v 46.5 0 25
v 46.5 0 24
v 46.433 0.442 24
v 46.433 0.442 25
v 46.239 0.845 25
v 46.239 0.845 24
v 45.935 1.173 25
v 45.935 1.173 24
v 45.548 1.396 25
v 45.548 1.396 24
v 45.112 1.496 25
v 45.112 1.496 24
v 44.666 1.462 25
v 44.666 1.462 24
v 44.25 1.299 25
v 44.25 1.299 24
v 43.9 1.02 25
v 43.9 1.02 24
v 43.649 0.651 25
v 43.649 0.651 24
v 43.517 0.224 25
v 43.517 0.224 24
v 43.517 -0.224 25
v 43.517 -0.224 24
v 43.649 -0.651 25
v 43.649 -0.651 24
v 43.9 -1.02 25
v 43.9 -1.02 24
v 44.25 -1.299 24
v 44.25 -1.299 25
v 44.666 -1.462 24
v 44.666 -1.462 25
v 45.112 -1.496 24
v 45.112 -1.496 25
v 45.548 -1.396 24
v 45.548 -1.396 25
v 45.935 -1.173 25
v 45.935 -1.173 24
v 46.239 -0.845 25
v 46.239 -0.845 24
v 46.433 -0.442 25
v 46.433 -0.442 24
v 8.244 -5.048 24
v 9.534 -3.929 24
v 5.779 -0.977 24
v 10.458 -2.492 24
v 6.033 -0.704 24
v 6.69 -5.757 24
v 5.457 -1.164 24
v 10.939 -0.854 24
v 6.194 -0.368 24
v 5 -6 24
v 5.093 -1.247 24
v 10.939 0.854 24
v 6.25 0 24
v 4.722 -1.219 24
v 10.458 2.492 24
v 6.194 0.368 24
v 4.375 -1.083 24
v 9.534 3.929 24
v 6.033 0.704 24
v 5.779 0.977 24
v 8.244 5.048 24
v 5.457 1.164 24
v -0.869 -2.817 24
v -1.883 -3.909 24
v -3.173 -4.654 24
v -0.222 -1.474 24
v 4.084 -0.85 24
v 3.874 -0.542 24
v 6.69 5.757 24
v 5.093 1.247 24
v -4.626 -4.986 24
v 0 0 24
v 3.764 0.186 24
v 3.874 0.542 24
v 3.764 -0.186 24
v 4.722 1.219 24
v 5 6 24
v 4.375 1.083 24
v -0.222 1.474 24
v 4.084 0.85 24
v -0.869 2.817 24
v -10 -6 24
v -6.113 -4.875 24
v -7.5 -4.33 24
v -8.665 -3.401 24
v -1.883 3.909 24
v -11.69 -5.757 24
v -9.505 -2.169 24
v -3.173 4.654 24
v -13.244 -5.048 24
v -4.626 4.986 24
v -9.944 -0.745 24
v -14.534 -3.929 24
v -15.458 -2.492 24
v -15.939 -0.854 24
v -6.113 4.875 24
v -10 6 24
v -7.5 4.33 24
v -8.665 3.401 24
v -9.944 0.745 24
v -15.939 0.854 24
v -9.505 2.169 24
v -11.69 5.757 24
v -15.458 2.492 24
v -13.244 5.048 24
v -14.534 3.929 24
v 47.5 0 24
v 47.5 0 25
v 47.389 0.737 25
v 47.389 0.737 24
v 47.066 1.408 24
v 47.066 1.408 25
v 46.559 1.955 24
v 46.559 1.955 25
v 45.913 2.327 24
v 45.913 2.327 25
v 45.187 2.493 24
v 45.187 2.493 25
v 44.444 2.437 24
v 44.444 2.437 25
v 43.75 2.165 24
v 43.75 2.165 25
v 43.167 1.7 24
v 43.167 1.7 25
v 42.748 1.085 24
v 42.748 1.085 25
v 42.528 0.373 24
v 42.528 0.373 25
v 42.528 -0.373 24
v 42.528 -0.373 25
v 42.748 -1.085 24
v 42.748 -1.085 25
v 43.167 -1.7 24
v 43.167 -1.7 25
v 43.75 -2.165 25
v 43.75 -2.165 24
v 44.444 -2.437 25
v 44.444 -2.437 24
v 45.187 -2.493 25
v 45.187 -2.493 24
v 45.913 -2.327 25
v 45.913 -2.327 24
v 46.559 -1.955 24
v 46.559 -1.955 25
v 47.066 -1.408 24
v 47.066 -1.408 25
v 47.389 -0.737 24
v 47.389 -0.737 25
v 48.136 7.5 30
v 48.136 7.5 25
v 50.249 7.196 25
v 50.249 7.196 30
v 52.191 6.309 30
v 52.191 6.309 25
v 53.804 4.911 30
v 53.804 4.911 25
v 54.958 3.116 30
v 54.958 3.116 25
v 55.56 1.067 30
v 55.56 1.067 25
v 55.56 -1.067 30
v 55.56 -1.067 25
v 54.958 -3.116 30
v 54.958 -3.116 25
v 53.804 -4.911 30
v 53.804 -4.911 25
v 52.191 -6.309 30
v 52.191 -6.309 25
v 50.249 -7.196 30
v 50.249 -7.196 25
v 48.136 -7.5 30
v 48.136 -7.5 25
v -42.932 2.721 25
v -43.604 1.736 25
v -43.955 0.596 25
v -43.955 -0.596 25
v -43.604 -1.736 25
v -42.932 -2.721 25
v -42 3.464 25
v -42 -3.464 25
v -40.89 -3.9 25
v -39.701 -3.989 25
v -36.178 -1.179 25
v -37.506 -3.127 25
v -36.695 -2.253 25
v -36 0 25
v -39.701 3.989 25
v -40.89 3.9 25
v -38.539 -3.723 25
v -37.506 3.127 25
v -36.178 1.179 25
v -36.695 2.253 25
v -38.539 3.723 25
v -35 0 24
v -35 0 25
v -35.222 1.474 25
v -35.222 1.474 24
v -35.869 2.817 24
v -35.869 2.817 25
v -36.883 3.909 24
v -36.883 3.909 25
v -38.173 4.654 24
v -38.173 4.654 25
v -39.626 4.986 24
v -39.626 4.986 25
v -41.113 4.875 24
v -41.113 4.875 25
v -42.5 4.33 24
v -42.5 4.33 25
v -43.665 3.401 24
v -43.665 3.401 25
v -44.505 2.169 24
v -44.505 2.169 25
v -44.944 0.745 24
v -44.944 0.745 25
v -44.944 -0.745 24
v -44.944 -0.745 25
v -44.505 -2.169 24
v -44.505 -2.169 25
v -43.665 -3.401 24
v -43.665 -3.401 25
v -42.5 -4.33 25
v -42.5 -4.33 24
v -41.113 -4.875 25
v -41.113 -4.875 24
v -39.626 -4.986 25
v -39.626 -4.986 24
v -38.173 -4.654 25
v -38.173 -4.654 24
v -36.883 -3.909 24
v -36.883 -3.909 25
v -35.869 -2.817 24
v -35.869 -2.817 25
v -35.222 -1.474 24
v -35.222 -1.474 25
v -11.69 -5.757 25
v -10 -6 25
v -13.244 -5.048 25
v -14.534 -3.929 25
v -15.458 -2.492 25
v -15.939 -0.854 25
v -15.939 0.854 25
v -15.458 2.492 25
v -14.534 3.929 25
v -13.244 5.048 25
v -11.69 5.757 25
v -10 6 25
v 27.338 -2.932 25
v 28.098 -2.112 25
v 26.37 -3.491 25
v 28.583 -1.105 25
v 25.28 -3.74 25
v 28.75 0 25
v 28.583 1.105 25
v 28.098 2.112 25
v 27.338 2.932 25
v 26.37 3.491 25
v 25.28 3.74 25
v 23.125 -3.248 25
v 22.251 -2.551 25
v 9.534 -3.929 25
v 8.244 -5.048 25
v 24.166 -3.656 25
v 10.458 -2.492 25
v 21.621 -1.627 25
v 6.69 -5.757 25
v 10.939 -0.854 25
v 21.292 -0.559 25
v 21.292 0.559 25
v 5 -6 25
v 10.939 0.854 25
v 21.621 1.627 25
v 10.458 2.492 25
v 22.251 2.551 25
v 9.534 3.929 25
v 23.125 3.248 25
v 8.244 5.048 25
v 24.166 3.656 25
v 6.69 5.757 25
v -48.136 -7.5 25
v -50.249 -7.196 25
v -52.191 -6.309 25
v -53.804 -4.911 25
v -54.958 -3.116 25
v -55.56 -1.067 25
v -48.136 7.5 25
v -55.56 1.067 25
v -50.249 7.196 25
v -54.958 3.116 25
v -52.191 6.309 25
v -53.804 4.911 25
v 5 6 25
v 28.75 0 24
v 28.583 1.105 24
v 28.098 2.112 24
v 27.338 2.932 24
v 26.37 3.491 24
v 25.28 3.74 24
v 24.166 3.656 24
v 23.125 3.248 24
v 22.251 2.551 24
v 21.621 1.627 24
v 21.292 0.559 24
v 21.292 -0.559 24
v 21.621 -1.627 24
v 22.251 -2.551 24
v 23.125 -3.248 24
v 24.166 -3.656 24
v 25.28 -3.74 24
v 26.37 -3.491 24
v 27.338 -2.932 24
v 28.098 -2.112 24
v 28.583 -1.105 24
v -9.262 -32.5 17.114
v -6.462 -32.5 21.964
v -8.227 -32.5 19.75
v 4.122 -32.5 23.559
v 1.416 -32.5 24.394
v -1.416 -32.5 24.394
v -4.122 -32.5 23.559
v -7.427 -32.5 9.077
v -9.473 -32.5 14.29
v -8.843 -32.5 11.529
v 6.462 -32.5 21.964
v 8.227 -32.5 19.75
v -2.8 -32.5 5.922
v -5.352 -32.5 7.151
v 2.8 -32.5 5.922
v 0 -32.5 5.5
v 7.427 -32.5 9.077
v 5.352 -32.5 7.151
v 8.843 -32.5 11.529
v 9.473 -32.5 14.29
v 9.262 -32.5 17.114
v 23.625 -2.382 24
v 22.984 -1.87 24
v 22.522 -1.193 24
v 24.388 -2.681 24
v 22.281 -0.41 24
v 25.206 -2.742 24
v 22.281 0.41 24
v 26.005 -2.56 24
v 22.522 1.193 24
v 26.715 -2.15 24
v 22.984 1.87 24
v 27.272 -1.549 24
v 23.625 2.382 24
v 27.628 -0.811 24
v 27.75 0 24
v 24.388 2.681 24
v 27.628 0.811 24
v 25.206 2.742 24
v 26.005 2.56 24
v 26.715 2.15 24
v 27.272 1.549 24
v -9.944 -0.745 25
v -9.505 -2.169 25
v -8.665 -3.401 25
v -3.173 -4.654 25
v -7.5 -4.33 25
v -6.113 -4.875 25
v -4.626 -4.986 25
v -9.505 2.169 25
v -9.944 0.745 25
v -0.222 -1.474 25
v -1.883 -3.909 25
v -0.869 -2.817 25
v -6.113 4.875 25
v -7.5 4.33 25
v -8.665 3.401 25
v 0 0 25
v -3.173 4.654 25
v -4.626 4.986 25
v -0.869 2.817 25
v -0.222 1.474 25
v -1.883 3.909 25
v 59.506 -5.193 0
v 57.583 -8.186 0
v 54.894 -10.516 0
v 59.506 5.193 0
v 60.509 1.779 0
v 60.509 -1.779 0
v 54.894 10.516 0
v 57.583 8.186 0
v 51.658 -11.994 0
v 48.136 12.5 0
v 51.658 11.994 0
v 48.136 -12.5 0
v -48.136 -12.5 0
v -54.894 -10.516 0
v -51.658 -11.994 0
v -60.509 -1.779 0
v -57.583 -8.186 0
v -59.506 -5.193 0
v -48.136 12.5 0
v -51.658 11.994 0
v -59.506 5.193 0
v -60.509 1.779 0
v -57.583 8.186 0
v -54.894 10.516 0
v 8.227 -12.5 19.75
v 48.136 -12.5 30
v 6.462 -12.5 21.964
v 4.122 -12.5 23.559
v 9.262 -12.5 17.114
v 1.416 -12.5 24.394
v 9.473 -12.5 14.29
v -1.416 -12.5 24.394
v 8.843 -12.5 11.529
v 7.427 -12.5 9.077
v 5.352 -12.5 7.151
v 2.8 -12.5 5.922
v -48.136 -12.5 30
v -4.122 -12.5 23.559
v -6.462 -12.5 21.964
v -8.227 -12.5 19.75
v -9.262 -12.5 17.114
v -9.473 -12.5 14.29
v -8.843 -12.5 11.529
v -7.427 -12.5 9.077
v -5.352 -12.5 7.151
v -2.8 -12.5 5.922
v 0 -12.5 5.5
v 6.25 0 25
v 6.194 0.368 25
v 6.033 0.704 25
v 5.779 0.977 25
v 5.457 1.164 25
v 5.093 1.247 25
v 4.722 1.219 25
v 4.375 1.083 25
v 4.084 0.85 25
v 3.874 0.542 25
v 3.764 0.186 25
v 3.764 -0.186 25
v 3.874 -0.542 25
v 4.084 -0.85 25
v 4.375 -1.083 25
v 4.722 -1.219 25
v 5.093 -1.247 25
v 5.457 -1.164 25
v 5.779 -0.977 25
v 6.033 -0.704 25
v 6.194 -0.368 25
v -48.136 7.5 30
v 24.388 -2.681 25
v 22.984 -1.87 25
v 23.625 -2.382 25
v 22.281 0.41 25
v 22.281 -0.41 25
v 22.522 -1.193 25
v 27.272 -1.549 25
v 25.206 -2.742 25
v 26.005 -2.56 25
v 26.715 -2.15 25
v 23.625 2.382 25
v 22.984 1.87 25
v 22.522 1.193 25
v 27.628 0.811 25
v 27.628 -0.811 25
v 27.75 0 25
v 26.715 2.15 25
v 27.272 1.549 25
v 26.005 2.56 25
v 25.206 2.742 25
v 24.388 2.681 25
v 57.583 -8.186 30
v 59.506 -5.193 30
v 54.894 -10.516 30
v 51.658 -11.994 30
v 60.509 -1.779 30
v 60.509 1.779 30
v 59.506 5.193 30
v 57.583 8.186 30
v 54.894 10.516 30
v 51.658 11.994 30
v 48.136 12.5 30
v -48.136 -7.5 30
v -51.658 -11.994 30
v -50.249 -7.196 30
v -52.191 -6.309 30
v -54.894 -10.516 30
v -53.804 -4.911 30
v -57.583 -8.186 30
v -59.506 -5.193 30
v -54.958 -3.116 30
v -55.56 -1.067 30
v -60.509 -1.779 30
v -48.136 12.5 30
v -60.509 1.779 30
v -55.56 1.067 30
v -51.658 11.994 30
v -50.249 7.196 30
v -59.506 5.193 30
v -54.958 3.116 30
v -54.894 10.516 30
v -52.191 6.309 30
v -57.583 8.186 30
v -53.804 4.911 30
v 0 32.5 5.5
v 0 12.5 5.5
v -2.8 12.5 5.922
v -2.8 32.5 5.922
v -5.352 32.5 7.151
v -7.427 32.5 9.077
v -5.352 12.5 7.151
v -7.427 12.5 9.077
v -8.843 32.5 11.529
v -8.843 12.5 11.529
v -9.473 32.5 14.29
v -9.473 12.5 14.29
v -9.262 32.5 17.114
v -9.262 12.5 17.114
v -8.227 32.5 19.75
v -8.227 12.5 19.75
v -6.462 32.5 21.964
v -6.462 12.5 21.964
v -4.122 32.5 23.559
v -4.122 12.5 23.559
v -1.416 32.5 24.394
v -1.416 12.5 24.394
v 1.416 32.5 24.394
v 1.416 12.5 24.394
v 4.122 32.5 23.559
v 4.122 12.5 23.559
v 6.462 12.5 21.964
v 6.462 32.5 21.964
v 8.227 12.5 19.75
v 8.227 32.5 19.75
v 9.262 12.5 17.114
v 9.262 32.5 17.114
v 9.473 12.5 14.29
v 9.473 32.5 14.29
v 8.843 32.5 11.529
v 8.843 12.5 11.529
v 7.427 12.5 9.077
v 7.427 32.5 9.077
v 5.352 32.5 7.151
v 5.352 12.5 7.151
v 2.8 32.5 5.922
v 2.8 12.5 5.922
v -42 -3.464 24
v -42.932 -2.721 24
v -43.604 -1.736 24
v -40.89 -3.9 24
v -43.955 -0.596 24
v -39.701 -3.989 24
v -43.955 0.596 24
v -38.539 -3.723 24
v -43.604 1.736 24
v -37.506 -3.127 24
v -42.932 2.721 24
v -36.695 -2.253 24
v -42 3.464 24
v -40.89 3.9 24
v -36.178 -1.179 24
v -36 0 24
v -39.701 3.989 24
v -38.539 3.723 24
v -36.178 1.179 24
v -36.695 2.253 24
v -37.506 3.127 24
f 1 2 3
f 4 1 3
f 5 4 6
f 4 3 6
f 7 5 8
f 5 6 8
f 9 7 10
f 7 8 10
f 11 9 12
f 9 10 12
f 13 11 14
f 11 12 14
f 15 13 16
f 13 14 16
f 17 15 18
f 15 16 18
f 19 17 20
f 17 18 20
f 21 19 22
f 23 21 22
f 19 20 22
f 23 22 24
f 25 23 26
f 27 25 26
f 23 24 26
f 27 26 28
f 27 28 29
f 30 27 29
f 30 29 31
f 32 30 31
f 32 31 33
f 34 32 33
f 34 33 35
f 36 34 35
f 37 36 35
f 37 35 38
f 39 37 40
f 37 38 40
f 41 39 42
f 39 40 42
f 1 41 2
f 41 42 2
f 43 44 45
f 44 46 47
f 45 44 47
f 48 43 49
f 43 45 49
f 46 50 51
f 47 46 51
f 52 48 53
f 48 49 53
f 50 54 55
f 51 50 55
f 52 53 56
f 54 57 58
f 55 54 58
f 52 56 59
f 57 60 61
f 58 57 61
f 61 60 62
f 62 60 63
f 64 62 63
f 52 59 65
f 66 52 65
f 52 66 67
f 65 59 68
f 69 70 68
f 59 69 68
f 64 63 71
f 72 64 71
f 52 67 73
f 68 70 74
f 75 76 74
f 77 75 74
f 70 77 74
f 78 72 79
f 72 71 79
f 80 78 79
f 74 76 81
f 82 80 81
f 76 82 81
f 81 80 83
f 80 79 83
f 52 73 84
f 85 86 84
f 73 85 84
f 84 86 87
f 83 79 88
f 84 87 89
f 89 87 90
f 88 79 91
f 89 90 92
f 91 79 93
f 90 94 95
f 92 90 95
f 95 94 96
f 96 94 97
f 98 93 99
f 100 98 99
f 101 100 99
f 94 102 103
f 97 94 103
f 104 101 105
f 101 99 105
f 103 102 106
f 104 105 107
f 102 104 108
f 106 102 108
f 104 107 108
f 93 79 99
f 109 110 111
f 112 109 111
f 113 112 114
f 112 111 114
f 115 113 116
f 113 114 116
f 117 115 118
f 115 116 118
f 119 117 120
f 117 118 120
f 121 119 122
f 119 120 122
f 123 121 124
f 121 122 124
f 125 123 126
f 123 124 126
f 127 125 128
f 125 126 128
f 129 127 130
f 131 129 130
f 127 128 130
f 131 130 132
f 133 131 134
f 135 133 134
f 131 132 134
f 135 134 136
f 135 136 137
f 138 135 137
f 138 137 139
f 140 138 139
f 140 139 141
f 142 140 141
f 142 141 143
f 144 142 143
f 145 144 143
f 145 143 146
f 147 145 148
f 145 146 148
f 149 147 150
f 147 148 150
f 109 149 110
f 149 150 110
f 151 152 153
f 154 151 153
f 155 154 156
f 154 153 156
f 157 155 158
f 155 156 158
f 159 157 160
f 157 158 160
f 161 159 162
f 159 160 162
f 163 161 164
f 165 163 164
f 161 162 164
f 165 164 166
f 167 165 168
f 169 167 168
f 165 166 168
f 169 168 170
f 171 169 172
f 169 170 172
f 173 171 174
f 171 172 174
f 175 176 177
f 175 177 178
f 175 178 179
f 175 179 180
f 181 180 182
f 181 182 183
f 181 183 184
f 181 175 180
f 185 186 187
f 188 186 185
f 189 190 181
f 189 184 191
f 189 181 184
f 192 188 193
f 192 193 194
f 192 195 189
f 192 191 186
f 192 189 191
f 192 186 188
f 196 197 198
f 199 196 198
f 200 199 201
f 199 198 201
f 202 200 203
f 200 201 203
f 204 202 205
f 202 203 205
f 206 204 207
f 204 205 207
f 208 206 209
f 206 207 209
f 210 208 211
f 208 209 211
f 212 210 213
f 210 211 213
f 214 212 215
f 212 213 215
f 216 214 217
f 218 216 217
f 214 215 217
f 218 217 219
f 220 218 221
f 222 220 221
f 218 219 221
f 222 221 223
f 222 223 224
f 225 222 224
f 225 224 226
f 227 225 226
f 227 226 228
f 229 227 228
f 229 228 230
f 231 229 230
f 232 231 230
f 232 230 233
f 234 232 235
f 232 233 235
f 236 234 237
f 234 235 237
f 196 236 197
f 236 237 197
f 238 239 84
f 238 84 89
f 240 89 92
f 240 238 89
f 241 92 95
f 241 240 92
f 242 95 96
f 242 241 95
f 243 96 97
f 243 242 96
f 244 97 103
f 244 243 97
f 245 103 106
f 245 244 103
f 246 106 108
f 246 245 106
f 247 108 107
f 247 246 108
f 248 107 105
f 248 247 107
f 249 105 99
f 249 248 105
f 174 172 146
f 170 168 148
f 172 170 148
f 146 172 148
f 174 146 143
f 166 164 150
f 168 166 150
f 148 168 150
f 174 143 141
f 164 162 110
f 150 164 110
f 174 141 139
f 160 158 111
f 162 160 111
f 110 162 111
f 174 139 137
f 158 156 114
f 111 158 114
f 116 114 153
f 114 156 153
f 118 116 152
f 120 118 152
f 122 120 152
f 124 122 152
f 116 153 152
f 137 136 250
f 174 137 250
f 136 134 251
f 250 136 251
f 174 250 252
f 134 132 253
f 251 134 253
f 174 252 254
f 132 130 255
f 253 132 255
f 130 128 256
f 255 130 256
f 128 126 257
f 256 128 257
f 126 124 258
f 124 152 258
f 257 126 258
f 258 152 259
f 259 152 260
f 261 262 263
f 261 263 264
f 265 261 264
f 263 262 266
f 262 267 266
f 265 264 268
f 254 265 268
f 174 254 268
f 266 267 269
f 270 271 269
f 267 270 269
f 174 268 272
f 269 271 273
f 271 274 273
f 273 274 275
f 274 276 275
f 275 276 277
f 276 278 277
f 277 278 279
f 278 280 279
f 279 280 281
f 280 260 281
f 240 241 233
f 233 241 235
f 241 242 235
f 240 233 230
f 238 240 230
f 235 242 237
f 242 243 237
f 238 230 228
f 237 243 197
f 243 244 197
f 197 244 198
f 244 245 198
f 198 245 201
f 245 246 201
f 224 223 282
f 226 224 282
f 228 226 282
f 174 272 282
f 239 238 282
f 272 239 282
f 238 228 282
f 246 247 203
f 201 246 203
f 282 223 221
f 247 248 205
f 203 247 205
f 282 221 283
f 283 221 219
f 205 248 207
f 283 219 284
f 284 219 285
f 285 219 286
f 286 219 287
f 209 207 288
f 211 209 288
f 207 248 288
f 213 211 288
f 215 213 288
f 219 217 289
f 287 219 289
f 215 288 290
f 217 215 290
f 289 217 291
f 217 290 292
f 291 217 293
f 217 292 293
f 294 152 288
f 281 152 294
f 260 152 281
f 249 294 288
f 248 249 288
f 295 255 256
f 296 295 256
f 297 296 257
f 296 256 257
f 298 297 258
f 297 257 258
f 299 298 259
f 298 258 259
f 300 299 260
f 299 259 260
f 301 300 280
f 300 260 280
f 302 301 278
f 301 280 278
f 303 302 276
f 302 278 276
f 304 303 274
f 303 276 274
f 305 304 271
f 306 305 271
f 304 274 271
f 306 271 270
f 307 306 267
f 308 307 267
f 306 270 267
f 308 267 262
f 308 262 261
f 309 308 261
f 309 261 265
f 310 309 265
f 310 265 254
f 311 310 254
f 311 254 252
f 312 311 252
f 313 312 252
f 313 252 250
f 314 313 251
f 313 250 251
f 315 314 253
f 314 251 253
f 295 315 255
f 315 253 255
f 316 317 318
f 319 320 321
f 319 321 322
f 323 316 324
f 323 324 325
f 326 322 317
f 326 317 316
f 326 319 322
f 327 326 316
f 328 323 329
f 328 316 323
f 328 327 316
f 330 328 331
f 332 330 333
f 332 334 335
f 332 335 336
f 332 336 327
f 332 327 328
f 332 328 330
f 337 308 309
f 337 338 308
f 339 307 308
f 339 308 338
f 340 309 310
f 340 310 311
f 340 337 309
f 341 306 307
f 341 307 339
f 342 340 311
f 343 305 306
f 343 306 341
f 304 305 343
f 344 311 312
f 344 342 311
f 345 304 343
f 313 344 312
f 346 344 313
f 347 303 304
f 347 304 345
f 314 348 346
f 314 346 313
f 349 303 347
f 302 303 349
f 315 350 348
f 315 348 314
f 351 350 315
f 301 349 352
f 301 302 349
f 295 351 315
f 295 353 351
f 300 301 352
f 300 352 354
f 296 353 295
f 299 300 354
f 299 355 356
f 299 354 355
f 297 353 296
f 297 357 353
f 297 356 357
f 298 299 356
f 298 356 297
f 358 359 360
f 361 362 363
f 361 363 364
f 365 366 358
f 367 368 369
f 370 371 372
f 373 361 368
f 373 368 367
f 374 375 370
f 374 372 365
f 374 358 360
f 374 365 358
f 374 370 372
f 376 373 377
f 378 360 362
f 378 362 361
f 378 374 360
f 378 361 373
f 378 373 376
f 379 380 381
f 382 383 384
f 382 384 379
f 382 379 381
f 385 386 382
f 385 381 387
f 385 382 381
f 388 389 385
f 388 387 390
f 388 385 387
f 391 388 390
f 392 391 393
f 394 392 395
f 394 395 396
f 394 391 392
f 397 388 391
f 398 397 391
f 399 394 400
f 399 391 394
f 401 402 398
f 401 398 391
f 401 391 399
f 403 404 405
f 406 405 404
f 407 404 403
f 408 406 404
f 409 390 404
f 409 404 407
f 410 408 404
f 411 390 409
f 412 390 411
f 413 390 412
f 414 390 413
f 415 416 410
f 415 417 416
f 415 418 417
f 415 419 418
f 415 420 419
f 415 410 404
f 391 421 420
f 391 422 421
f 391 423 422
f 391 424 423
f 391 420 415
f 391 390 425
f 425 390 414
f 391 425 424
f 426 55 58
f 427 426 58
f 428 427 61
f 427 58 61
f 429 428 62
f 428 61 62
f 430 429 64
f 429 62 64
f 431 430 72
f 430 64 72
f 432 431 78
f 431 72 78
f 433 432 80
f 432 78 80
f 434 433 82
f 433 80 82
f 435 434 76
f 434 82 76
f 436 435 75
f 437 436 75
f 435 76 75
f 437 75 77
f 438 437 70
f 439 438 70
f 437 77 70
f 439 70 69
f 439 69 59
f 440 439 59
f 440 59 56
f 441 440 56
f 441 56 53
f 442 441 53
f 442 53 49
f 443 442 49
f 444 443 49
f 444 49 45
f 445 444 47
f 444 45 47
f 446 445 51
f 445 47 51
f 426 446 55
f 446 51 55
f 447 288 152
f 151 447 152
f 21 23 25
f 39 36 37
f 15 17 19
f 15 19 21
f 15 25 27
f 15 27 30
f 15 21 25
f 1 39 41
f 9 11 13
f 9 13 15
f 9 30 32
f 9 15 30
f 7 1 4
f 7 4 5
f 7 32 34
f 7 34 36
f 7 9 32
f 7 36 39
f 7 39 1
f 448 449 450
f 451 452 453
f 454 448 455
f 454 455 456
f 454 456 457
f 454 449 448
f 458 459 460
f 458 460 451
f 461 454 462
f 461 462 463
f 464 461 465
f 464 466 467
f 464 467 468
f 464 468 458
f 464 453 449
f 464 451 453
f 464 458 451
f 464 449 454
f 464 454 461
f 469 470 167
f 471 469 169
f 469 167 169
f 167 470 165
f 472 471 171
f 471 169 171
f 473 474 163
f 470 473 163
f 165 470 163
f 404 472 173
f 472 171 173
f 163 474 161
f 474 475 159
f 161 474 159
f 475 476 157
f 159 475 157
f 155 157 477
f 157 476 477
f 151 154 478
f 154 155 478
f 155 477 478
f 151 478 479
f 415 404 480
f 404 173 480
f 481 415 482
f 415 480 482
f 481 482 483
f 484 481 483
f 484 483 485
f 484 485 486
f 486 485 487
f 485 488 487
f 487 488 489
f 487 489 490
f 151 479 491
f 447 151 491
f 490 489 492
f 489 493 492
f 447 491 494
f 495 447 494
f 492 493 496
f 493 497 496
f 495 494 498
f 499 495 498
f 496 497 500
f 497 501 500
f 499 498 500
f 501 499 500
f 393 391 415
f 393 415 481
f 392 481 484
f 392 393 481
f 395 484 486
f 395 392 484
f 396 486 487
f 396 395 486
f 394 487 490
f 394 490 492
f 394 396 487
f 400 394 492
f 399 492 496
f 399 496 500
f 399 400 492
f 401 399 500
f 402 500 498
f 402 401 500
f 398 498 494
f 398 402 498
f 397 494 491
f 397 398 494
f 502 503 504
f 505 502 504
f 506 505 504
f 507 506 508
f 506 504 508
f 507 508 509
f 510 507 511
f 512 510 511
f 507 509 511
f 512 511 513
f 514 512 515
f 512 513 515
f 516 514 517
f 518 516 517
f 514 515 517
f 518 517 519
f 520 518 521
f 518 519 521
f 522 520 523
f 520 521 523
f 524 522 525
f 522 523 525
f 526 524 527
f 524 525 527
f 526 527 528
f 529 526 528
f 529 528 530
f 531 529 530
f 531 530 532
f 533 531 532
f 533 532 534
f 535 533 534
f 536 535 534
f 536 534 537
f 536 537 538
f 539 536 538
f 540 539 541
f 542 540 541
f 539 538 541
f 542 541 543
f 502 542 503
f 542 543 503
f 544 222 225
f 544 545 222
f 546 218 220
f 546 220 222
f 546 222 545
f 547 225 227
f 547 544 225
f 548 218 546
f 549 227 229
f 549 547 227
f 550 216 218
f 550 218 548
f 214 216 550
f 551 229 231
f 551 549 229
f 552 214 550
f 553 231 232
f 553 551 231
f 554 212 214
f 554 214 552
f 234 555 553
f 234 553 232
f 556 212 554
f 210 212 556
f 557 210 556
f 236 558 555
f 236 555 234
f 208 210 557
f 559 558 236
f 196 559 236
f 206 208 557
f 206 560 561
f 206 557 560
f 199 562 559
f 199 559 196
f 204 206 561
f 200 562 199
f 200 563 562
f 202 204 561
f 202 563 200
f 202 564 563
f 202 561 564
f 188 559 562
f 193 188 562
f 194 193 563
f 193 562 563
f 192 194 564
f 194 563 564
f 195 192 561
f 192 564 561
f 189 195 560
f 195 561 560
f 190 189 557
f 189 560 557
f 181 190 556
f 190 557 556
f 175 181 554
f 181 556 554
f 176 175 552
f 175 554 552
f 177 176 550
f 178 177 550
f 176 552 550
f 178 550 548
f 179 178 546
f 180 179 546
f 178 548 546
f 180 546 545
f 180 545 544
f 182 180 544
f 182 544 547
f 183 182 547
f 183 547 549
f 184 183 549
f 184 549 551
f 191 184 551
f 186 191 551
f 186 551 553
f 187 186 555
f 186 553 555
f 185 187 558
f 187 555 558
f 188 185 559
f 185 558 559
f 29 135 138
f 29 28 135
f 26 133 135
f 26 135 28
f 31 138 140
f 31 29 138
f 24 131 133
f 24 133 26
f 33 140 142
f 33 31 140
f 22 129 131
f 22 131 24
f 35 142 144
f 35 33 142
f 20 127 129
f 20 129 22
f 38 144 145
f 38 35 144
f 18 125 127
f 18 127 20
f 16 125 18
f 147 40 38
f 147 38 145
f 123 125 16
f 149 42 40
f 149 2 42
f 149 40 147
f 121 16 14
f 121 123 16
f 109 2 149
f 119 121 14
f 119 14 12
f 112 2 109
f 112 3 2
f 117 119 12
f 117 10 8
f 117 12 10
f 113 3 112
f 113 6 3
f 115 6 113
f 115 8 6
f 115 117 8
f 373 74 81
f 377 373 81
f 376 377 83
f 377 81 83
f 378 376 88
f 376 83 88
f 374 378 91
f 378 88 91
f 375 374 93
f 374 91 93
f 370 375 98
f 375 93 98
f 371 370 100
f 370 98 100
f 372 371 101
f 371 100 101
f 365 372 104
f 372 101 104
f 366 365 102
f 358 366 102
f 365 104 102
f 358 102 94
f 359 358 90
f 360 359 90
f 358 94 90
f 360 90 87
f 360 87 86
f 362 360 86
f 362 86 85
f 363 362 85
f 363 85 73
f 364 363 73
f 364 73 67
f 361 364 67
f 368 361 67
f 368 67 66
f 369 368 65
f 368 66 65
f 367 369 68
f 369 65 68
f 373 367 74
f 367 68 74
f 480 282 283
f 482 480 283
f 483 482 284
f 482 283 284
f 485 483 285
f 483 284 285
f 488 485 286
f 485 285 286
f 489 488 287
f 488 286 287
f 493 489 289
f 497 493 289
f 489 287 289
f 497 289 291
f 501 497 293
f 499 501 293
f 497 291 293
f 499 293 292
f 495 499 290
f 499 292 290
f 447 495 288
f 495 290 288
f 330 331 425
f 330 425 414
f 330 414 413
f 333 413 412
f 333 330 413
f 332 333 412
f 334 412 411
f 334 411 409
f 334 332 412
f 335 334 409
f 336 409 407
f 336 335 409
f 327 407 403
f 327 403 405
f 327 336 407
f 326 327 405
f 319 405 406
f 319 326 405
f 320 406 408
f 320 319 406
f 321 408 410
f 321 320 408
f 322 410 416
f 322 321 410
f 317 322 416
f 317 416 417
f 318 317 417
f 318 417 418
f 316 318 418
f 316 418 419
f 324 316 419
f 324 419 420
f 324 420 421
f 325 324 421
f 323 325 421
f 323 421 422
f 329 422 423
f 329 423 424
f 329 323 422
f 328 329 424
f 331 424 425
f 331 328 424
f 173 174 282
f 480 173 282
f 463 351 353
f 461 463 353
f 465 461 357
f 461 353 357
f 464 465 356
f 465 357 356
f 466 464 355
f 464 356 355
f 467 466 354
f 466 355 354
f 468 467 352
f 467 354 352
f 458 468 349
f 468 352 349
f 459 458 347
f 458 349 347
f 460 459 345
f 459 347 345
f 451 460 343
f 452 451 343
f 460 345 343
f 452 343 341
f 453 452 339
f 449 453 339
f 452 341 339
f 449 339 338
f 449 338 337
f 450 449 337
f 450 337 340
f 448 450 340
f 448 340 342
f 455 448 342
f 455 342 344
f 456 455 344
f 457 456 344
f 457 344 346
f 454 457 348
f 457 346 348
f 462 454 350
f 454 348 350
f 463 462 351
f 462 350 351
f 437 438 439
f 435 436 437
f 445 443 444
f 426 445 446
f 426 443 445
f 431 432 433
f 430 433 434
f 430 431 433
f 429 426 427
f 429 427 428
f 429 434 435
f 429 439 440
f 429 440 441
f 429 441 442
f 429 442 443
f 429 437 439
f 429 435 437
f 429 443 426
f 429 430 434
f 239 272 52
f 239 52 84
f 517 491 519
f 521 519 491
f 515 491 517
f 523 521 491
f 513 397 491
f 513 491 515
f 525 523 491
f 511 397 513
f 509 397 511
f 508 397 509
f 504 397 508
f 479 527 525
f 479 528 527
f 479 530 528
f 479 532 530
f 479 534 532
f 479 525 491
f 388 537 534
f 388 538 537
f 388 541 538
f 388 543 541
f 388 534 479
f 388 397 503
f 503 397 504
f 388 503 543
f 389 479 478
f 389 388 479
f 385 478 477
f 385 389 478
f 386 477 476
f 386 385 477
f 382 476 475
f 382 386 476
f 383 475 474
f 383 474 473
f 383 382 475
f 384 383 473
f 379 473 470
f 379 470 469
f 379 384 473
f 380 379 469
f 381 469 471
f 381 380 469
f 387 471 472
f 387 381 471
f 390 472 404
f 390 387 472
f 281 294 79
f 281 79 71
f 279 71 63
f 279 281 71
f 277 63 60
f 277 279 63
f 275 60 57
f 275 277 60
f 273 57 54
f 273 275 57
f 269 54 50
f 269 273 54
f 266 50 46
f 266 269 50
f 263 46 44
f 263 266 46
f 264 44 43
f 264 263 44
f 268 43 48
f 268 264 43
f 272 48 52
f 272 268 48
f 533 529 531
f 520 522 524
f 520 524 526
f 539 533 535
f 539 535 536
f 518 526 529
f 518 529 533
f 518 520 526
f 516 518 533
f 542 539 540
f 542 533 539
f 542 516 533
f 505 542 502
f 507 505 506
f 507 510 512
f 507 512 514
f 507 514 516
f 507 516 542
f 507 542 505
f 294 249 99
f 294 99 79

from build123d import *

# Parameters (mm, degrees)
BOSS_EXTRUDE1_DEPTH = 25
EXTRUDE_THIN2_DEPTH = 5
SKETCH3_R           = 5
SKETCH3_R_2         = 3.75
SKETCH3_R_3         = 2.5
CUT_EXTRUDE1_DEPTH  = 1
SKETCH4_R           = 5
SKETCH4_R_2         = 1.25
SKETCH4_R_3         = 4
SKETCH4_R_4         = 2.75
SKETCH4_R_5         = 1.5
BOSS_EXTRUDE2_DEPTH = 1
SKETCH5_R           = 9.5
BOSS_EXTRUDE4_DEPTH = 20
BOSS_EXTRUDE5_START = 20
SKETCH7_R           = 9.5
BOSS_EXTRUDE5_DEPTH = 20


with BuildPart() as part:
    # Sketch1 → Boss-Extrude1 (new body)
    with BuildSketch(Plane.XY):
        with BuildLine():
            Line((-48.13609402, 12.5), (48.13609402, 12.5))
            ThreePointArc((48.13609402, 12.5), (60.63609402, 0), (48.13609402, -12.5))
            Line((48.13609402, -12.5), (-48.13609402, -12.5))
            ThreePointArc((-48.13609402, -12.5), (-60.63609402, 0), (-48.13609402, 12.5))
        make_face()
    extrude(amount=BOSS_EXTRUDE1_DEPTH)

    # Sketch2 → Extrude-Thin2 (add)
    with BuildSketch(Plane.XY.offset(25)):
        with BuildLine():
            Line((48.13609402, -12.5), (-48.13609402, -12.5))
            ThreePointArc((-48.13609402, -12.5), (-60.63609402, 0), (-48.13609402, 12.5))
            Line((-48.13609402, 12.5), (48.13609402, 12.5))
            ThreePointArc((48.13609402, 12.5), (60.63609402, 0), (48.13609402, -12.5))
        make_face()
        with BuildLine():
            Line((48.13609402, -7.5), (-48.13609402, -7.5))
            ThreePointArc((-48.13609402, -7.5), (-55.63609402, 0), (-48.13609402, 7.5))
            Line((-48.13609402, 7.5), (48.13609402, 7.5))
            ThreePointArc((48.13609402, 7.5), (55.63609402, 0), (48.13609402, -7.5))
        make_face(mode=Mode.SUBTRACT)
    extrude(amount=EXTRUDE_THIN2_DEPTH)

    # Sketch3 → Cut-Extrude1 (cut)
    with BuildSketch(Plane.XY.offset(25)):
        with Locations((-40, 0)):
            Circle(SKETCH3_R)
        with Locations((25, 0)):
            Circle(SKETCH3_R_2)
        with Locations((45, 0)):
            Circle(SKETCH3_R_3)
        with BuildLine():
            Line((-10, 6), (5, 6))
            ThreePointArc((5, 6), (11, 0), (5, -6))
            Line((5, -6), (-10, -6))
            ThreePointArc((-10, -6), (-16, 0), (-10, 6))
        make_face()
    extrude(amount=-CUT_EXTRUDE1_DEPTH, mode=Mode.SUBTRACT)

    # Sketch4 → Boss-Extrude2 (add)
    with BuildSketch(Plane.XY.offset(24)):
        with Locations((-5, 0)):
            Circle(SKETCH4_R)
        with Locations((5, 0)):
            Circle(SKETCH4_R_2)
        with Locations((-40, 0)):
            Circle(SKETCH4_R_3)
        with Locations((25, 0)):
            Circle(SKETCH4_R_4)
        with Locations((45, 0)):
            Circle(SKETCH4_R_5)
    extrude(amount=BOSS_EXTRUDE2_DEPTH)

    # Sketch5 → Boss-Extrude4 (add)
    with BuildSketch(Plane(origin=(0, 12.5, 0), x_dir=(1, 0, 0), z_dir=(0, 1, 0))):
        with Locations(Location((0, -15, 0), (0, 0, 90))):
            Circle(SKETCH5_R)
    extrude(amount=BOSS_EXTRUDE4_DEPTH)

    # Sketch7 → Boss-Extrude5 (add)
    with BuildSketch(Plane.XZ.offset(12.5).offset(BOSS_EXTRUDE5_START)):
        with Locations(Location((0, 15, 0), (0, 0, 270))):
            Circle(SKETCH7_R)
    extrude(amount=-BOSS_EXTRUDE5_DEPTH)


solid = part.part
